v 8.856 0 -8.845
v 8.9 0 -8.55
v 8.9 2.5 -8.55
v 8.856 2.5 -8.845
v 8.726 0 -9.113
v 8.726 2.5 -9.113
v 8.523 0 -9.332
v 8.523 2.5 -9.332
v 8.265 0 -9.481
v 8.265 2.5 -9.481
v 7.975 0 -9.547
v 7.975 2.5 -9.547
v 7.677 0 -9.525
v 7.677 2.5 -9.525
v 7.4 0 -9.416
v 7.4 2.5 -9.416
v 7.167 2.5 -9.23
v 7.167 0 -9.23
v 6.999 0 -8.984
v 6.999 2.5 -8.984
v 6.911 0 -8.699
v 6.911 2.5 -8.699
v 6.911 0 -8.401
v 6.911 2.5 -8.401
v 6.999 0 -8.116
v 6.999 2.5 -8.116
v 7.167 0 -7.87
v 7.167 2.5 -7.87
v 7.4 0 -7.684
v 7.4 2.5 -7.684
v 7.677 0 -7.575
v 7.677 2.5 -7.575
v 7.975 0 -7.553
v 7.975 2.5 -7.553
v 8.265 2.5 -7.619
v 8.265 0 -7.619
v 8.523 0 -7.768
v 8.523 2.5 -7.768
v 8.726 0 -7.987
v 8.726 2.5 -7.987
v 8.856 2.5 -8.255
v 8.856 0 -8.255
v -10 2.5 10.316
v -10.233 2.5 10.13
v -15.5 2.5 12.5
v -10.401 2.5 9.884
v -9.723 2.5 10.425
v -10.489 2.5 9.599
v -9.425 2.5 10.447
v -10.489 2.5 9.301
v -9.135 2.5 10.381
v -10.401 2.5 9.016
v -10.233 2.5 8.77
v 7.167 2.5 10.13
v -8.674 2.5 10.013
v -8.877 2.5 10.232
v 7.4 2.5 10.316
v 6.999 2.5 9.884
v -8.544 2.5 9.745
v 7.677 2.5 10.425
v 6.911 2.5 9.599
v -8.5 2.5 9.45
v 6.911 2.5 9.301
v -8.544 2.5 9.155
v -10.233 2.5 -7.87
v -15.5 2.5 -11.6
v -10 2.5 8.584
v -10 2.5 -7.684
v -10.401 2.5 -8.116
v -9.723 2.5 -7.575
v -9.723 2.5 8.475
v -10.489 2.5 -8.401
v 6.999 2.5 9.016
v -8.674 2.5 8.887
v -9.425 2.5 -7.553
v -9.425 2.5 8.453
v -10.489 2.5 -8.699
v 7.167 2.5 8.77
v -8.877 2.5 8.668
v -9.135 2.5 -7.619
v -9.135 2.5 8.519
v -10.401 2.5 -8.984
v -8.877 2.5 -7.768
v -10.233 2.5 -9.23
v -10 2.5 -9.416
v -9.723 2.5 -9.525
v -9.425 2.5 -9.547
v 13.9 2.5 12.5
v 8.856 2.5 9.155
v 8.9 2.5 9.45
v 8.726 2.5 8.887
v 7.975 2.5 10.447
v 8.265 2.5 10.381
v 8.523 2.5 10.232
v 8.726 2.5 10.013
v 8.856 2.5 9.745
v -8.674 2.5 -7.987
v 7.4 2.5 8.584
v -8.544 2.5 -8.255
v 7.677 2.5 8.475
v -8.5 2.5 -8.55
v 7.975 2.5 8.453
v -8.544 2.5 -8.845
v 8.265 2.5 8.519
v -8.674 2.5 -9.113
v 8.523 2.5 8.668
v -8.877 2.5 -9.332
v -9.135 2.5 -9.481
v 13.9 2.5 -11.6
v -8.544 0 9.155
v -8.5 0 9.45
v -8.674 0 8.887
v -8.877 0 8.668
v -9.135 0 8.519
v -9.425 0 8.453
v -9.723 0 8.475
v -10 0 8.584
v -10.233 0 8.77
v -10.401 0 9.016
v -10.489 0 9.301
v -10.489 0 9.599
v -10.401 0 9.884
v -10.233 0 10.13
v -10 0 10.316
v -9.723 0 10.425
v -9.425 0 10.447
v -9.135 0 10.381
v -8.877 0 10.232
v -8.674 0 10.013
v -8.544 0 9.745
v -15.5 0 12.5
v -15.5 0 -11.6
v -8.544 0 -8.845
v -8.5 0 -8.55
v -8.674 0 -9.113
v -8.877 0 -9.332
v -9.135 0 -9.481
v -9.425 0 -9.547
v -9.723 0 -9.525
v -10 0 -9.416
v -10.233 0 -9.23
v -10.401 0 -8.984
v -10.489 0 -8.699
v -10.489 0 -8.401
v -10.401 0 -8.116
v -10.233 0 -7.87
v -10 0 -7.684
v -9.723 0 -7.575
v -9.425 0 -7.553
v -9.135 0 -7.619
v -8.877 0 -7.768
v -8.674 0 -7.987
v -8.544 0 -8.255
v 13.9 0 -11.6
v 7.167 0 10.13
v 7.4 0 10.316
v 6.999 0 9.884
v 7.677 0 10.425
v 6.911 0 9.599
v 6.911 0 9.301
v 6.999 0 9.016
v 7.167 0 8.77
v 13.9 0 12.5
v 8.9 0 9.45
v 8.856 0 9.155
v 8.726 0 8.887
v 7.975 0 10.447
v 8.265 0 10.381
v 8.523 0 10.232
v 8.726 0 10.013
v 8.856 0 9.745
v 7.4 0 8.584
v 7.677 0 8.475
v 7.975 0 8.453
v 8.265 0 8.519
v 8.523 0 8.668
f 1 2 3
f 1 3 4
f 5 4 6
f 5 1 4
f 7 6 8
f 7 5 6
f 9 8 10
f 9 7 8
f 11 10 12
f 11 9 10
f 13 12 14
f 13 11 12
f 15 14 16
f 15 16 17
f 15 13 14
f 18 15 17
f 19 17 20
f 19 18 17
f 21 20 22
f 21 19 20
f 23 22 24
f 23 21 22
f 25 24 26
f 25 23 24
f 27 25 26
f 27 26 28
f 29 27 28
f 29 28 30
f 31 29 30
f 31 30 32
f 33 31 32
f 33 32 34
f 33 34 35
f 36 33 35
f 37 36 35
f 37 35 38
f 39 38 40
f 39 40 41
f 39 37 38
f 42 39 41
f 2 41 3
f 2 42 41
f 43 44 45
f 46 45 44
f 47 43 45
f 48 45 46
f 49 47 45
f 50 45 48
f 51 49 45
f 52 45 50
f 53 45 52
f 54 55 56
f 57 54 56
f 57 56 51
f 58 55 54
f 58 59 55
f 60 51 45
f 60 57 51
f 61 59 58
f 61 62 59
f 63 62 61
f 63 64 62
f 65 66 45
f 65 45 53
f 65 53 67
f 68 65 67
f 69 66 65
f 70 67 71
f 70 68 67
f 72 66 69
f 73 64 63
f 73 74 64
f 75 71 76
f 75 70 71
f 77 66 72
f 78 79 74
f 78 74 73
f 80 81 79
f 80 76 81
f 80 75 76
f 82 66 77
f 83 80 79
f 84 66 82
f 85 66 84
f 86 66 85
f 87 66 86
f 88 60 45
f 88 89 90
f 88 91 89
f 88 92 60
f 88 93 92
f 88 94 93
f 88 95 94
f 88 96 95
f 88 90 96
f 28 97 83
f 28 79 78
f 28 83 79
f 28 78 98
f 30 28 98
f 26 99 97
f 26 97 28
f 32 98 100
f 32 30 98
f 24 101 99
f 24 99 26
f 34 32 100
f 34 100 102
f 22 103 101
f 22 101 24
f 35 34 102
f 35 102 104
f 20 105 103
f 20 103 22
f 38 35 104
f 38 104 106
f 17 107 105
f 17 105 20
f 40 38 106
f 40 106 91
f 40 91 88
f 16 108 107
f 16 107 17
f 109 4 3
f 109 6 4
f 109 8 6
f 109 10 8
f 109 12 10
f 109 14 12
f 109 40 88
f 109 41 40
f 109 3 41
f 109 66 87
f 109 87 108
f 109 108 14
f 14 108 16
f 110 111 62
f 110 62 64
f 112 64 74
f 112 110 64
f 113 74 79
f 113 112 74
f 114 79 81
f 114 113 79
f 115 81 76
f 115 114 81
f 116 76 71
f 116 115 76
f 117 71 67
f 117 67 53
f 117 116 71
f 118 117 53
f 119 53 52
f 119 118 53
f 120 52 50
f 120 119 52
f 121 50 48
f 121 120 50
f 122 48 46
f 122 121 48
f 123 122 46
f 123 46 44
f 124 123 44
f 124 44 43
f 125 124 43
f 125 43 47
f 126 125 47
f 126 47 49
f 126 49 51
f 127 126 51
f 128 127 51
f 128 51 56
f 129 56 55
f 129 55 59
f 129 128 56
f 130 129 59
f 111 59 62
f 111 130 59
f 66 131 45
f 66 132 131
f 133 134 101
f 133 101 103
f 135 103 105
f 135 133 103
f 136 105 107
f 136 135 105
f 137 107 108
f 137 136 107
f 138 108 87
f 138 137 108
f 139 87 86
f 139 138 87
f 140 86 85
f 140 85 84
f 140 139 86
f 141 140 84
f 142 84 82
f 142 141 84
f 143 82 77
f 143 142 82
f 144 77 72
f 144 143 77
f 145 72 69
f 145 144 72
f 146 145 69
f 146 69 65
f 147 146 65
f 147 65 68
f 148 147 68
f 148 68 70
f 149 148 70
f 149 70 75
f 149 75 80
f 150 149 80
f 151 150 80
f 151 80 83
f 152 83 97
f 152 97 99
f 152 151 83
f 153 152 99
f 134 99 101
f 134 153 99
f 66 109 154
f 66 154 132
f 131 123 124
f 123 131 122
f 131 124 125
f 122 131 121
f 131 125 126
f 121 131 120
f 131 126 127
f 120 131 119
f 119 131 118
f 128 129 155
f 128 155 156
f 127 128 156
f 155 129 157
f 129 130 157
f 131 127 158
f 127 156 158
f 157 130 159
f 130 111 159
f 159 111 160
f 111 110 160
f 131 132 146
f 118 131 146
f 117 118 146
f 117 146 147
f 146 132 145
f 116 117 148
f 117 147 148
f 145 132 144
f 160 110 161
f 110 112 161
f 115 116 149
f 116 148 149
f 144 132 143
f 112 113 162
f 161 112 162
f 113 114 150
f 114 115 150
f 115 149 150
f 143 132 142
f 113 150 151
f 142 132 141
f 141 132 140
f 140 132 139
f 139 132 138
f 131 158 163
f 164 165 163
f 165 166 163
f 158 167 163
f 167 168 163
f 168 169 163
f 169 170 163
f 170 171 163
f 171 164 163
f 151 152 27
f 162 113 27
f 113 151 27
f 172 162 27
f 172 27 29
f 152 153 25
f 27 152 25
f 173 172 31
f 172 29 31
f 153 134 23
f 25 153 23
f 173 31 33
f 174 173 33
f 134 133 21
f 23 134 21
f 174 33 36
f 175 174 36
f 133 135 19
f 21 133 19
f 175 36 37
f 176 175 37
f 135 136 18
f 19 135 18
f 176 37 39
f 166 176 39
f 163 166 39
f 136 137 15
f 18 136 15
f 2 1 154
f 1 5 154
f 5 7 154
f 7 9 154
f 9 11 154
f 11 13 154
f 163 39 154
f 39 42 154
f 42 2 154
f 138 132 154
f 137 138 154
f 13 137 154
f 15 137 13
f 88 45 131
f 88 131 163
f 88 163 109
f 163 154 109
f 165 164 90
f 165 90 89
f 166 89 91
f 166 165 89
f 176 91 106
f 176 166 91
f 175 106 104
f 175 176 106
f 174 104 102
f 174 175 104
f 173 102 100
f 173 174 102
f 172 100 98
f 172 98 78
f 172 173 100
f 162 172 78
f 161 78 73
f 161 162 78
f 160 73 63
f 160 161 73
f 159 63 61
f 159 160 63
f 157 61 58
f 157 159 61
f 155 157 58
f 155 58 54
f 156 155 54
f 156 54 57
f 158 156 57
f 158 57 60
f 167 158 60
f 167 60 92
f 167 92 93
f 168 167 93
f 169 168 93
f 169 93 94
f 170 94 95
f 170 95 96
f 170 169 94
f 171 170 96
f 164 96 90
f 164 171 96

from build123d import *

# Parameters (mm, degrees)
SKETCH1_W           = 29.4
SKETCH1_H           = 23.1
SKETCH1_R           = 1
BOSS_EXTRUDE1_DEPTH = 2.5
SKETCH2_W           = 29.4
SKETCH2_H           = 2.5
BOSS_EXTRUDE2_DEPTH = 0.5
SKETCH3_W           = 29.4
SKETCH3_H           = 2.5
BOSS_EXTRUDE3_DEPTH = 0.5


with BuildPart() as part:
    # Sketch1 → Boss-Extrude1 (new body)
    with BuildSketch(Plane(origin=(0, 0, 0), x_dir=(1, 0, 0), z_dir=(0, 1, 0))):
        with Locations((-0.8, -0.45)):
            Rectangle(SKETCH1_W, SKETCH1_H)
        with Locations((-9.5, 8.55)):
            Circle(SKETCH1_R, mode=Mode.SUBTRACT)
        with Locations((7.9, 8.55)):
            Circle(SKETCH1_R, mode=Mode.SUBTRACT)
        with Locations((7.9, -9.45)):
            Circle(SKETCH1_R, mode=Mode.SUBTRACT)
        with Locations((-9.5, -9.45)):
            Circle(SKETCH1_R, mode=Mode.SUBTRACT)
    extrude(amount=BOSS_EXTRUDE1_DEPTH)

    # Sketch2 → Boss-Extrude2 (add)
    with BuildSketch(Plane(origin=(0, 0, -11.1), x_dir=(-1, 0, 0), z_dir=(0, 0, -1))):
        with Locations((0.8, 1.25)):
            Rectangle(SKETCH2_W, SKETCH2_H)
    extrude(amount=BOSS_EXTRUDE2_DEPTH)

    # Sketch3 → Boss-Extrude3 (add)
    with BuildSketch(Plane.XY.offset(12)):
        with Locations((-0.8, 1.25)):
            Rectangle(SKETCH3_W, SKETCH3_H)
    extrude(amount=BOSS_EXTRUDE3_DEPTH)


solid = part.part
